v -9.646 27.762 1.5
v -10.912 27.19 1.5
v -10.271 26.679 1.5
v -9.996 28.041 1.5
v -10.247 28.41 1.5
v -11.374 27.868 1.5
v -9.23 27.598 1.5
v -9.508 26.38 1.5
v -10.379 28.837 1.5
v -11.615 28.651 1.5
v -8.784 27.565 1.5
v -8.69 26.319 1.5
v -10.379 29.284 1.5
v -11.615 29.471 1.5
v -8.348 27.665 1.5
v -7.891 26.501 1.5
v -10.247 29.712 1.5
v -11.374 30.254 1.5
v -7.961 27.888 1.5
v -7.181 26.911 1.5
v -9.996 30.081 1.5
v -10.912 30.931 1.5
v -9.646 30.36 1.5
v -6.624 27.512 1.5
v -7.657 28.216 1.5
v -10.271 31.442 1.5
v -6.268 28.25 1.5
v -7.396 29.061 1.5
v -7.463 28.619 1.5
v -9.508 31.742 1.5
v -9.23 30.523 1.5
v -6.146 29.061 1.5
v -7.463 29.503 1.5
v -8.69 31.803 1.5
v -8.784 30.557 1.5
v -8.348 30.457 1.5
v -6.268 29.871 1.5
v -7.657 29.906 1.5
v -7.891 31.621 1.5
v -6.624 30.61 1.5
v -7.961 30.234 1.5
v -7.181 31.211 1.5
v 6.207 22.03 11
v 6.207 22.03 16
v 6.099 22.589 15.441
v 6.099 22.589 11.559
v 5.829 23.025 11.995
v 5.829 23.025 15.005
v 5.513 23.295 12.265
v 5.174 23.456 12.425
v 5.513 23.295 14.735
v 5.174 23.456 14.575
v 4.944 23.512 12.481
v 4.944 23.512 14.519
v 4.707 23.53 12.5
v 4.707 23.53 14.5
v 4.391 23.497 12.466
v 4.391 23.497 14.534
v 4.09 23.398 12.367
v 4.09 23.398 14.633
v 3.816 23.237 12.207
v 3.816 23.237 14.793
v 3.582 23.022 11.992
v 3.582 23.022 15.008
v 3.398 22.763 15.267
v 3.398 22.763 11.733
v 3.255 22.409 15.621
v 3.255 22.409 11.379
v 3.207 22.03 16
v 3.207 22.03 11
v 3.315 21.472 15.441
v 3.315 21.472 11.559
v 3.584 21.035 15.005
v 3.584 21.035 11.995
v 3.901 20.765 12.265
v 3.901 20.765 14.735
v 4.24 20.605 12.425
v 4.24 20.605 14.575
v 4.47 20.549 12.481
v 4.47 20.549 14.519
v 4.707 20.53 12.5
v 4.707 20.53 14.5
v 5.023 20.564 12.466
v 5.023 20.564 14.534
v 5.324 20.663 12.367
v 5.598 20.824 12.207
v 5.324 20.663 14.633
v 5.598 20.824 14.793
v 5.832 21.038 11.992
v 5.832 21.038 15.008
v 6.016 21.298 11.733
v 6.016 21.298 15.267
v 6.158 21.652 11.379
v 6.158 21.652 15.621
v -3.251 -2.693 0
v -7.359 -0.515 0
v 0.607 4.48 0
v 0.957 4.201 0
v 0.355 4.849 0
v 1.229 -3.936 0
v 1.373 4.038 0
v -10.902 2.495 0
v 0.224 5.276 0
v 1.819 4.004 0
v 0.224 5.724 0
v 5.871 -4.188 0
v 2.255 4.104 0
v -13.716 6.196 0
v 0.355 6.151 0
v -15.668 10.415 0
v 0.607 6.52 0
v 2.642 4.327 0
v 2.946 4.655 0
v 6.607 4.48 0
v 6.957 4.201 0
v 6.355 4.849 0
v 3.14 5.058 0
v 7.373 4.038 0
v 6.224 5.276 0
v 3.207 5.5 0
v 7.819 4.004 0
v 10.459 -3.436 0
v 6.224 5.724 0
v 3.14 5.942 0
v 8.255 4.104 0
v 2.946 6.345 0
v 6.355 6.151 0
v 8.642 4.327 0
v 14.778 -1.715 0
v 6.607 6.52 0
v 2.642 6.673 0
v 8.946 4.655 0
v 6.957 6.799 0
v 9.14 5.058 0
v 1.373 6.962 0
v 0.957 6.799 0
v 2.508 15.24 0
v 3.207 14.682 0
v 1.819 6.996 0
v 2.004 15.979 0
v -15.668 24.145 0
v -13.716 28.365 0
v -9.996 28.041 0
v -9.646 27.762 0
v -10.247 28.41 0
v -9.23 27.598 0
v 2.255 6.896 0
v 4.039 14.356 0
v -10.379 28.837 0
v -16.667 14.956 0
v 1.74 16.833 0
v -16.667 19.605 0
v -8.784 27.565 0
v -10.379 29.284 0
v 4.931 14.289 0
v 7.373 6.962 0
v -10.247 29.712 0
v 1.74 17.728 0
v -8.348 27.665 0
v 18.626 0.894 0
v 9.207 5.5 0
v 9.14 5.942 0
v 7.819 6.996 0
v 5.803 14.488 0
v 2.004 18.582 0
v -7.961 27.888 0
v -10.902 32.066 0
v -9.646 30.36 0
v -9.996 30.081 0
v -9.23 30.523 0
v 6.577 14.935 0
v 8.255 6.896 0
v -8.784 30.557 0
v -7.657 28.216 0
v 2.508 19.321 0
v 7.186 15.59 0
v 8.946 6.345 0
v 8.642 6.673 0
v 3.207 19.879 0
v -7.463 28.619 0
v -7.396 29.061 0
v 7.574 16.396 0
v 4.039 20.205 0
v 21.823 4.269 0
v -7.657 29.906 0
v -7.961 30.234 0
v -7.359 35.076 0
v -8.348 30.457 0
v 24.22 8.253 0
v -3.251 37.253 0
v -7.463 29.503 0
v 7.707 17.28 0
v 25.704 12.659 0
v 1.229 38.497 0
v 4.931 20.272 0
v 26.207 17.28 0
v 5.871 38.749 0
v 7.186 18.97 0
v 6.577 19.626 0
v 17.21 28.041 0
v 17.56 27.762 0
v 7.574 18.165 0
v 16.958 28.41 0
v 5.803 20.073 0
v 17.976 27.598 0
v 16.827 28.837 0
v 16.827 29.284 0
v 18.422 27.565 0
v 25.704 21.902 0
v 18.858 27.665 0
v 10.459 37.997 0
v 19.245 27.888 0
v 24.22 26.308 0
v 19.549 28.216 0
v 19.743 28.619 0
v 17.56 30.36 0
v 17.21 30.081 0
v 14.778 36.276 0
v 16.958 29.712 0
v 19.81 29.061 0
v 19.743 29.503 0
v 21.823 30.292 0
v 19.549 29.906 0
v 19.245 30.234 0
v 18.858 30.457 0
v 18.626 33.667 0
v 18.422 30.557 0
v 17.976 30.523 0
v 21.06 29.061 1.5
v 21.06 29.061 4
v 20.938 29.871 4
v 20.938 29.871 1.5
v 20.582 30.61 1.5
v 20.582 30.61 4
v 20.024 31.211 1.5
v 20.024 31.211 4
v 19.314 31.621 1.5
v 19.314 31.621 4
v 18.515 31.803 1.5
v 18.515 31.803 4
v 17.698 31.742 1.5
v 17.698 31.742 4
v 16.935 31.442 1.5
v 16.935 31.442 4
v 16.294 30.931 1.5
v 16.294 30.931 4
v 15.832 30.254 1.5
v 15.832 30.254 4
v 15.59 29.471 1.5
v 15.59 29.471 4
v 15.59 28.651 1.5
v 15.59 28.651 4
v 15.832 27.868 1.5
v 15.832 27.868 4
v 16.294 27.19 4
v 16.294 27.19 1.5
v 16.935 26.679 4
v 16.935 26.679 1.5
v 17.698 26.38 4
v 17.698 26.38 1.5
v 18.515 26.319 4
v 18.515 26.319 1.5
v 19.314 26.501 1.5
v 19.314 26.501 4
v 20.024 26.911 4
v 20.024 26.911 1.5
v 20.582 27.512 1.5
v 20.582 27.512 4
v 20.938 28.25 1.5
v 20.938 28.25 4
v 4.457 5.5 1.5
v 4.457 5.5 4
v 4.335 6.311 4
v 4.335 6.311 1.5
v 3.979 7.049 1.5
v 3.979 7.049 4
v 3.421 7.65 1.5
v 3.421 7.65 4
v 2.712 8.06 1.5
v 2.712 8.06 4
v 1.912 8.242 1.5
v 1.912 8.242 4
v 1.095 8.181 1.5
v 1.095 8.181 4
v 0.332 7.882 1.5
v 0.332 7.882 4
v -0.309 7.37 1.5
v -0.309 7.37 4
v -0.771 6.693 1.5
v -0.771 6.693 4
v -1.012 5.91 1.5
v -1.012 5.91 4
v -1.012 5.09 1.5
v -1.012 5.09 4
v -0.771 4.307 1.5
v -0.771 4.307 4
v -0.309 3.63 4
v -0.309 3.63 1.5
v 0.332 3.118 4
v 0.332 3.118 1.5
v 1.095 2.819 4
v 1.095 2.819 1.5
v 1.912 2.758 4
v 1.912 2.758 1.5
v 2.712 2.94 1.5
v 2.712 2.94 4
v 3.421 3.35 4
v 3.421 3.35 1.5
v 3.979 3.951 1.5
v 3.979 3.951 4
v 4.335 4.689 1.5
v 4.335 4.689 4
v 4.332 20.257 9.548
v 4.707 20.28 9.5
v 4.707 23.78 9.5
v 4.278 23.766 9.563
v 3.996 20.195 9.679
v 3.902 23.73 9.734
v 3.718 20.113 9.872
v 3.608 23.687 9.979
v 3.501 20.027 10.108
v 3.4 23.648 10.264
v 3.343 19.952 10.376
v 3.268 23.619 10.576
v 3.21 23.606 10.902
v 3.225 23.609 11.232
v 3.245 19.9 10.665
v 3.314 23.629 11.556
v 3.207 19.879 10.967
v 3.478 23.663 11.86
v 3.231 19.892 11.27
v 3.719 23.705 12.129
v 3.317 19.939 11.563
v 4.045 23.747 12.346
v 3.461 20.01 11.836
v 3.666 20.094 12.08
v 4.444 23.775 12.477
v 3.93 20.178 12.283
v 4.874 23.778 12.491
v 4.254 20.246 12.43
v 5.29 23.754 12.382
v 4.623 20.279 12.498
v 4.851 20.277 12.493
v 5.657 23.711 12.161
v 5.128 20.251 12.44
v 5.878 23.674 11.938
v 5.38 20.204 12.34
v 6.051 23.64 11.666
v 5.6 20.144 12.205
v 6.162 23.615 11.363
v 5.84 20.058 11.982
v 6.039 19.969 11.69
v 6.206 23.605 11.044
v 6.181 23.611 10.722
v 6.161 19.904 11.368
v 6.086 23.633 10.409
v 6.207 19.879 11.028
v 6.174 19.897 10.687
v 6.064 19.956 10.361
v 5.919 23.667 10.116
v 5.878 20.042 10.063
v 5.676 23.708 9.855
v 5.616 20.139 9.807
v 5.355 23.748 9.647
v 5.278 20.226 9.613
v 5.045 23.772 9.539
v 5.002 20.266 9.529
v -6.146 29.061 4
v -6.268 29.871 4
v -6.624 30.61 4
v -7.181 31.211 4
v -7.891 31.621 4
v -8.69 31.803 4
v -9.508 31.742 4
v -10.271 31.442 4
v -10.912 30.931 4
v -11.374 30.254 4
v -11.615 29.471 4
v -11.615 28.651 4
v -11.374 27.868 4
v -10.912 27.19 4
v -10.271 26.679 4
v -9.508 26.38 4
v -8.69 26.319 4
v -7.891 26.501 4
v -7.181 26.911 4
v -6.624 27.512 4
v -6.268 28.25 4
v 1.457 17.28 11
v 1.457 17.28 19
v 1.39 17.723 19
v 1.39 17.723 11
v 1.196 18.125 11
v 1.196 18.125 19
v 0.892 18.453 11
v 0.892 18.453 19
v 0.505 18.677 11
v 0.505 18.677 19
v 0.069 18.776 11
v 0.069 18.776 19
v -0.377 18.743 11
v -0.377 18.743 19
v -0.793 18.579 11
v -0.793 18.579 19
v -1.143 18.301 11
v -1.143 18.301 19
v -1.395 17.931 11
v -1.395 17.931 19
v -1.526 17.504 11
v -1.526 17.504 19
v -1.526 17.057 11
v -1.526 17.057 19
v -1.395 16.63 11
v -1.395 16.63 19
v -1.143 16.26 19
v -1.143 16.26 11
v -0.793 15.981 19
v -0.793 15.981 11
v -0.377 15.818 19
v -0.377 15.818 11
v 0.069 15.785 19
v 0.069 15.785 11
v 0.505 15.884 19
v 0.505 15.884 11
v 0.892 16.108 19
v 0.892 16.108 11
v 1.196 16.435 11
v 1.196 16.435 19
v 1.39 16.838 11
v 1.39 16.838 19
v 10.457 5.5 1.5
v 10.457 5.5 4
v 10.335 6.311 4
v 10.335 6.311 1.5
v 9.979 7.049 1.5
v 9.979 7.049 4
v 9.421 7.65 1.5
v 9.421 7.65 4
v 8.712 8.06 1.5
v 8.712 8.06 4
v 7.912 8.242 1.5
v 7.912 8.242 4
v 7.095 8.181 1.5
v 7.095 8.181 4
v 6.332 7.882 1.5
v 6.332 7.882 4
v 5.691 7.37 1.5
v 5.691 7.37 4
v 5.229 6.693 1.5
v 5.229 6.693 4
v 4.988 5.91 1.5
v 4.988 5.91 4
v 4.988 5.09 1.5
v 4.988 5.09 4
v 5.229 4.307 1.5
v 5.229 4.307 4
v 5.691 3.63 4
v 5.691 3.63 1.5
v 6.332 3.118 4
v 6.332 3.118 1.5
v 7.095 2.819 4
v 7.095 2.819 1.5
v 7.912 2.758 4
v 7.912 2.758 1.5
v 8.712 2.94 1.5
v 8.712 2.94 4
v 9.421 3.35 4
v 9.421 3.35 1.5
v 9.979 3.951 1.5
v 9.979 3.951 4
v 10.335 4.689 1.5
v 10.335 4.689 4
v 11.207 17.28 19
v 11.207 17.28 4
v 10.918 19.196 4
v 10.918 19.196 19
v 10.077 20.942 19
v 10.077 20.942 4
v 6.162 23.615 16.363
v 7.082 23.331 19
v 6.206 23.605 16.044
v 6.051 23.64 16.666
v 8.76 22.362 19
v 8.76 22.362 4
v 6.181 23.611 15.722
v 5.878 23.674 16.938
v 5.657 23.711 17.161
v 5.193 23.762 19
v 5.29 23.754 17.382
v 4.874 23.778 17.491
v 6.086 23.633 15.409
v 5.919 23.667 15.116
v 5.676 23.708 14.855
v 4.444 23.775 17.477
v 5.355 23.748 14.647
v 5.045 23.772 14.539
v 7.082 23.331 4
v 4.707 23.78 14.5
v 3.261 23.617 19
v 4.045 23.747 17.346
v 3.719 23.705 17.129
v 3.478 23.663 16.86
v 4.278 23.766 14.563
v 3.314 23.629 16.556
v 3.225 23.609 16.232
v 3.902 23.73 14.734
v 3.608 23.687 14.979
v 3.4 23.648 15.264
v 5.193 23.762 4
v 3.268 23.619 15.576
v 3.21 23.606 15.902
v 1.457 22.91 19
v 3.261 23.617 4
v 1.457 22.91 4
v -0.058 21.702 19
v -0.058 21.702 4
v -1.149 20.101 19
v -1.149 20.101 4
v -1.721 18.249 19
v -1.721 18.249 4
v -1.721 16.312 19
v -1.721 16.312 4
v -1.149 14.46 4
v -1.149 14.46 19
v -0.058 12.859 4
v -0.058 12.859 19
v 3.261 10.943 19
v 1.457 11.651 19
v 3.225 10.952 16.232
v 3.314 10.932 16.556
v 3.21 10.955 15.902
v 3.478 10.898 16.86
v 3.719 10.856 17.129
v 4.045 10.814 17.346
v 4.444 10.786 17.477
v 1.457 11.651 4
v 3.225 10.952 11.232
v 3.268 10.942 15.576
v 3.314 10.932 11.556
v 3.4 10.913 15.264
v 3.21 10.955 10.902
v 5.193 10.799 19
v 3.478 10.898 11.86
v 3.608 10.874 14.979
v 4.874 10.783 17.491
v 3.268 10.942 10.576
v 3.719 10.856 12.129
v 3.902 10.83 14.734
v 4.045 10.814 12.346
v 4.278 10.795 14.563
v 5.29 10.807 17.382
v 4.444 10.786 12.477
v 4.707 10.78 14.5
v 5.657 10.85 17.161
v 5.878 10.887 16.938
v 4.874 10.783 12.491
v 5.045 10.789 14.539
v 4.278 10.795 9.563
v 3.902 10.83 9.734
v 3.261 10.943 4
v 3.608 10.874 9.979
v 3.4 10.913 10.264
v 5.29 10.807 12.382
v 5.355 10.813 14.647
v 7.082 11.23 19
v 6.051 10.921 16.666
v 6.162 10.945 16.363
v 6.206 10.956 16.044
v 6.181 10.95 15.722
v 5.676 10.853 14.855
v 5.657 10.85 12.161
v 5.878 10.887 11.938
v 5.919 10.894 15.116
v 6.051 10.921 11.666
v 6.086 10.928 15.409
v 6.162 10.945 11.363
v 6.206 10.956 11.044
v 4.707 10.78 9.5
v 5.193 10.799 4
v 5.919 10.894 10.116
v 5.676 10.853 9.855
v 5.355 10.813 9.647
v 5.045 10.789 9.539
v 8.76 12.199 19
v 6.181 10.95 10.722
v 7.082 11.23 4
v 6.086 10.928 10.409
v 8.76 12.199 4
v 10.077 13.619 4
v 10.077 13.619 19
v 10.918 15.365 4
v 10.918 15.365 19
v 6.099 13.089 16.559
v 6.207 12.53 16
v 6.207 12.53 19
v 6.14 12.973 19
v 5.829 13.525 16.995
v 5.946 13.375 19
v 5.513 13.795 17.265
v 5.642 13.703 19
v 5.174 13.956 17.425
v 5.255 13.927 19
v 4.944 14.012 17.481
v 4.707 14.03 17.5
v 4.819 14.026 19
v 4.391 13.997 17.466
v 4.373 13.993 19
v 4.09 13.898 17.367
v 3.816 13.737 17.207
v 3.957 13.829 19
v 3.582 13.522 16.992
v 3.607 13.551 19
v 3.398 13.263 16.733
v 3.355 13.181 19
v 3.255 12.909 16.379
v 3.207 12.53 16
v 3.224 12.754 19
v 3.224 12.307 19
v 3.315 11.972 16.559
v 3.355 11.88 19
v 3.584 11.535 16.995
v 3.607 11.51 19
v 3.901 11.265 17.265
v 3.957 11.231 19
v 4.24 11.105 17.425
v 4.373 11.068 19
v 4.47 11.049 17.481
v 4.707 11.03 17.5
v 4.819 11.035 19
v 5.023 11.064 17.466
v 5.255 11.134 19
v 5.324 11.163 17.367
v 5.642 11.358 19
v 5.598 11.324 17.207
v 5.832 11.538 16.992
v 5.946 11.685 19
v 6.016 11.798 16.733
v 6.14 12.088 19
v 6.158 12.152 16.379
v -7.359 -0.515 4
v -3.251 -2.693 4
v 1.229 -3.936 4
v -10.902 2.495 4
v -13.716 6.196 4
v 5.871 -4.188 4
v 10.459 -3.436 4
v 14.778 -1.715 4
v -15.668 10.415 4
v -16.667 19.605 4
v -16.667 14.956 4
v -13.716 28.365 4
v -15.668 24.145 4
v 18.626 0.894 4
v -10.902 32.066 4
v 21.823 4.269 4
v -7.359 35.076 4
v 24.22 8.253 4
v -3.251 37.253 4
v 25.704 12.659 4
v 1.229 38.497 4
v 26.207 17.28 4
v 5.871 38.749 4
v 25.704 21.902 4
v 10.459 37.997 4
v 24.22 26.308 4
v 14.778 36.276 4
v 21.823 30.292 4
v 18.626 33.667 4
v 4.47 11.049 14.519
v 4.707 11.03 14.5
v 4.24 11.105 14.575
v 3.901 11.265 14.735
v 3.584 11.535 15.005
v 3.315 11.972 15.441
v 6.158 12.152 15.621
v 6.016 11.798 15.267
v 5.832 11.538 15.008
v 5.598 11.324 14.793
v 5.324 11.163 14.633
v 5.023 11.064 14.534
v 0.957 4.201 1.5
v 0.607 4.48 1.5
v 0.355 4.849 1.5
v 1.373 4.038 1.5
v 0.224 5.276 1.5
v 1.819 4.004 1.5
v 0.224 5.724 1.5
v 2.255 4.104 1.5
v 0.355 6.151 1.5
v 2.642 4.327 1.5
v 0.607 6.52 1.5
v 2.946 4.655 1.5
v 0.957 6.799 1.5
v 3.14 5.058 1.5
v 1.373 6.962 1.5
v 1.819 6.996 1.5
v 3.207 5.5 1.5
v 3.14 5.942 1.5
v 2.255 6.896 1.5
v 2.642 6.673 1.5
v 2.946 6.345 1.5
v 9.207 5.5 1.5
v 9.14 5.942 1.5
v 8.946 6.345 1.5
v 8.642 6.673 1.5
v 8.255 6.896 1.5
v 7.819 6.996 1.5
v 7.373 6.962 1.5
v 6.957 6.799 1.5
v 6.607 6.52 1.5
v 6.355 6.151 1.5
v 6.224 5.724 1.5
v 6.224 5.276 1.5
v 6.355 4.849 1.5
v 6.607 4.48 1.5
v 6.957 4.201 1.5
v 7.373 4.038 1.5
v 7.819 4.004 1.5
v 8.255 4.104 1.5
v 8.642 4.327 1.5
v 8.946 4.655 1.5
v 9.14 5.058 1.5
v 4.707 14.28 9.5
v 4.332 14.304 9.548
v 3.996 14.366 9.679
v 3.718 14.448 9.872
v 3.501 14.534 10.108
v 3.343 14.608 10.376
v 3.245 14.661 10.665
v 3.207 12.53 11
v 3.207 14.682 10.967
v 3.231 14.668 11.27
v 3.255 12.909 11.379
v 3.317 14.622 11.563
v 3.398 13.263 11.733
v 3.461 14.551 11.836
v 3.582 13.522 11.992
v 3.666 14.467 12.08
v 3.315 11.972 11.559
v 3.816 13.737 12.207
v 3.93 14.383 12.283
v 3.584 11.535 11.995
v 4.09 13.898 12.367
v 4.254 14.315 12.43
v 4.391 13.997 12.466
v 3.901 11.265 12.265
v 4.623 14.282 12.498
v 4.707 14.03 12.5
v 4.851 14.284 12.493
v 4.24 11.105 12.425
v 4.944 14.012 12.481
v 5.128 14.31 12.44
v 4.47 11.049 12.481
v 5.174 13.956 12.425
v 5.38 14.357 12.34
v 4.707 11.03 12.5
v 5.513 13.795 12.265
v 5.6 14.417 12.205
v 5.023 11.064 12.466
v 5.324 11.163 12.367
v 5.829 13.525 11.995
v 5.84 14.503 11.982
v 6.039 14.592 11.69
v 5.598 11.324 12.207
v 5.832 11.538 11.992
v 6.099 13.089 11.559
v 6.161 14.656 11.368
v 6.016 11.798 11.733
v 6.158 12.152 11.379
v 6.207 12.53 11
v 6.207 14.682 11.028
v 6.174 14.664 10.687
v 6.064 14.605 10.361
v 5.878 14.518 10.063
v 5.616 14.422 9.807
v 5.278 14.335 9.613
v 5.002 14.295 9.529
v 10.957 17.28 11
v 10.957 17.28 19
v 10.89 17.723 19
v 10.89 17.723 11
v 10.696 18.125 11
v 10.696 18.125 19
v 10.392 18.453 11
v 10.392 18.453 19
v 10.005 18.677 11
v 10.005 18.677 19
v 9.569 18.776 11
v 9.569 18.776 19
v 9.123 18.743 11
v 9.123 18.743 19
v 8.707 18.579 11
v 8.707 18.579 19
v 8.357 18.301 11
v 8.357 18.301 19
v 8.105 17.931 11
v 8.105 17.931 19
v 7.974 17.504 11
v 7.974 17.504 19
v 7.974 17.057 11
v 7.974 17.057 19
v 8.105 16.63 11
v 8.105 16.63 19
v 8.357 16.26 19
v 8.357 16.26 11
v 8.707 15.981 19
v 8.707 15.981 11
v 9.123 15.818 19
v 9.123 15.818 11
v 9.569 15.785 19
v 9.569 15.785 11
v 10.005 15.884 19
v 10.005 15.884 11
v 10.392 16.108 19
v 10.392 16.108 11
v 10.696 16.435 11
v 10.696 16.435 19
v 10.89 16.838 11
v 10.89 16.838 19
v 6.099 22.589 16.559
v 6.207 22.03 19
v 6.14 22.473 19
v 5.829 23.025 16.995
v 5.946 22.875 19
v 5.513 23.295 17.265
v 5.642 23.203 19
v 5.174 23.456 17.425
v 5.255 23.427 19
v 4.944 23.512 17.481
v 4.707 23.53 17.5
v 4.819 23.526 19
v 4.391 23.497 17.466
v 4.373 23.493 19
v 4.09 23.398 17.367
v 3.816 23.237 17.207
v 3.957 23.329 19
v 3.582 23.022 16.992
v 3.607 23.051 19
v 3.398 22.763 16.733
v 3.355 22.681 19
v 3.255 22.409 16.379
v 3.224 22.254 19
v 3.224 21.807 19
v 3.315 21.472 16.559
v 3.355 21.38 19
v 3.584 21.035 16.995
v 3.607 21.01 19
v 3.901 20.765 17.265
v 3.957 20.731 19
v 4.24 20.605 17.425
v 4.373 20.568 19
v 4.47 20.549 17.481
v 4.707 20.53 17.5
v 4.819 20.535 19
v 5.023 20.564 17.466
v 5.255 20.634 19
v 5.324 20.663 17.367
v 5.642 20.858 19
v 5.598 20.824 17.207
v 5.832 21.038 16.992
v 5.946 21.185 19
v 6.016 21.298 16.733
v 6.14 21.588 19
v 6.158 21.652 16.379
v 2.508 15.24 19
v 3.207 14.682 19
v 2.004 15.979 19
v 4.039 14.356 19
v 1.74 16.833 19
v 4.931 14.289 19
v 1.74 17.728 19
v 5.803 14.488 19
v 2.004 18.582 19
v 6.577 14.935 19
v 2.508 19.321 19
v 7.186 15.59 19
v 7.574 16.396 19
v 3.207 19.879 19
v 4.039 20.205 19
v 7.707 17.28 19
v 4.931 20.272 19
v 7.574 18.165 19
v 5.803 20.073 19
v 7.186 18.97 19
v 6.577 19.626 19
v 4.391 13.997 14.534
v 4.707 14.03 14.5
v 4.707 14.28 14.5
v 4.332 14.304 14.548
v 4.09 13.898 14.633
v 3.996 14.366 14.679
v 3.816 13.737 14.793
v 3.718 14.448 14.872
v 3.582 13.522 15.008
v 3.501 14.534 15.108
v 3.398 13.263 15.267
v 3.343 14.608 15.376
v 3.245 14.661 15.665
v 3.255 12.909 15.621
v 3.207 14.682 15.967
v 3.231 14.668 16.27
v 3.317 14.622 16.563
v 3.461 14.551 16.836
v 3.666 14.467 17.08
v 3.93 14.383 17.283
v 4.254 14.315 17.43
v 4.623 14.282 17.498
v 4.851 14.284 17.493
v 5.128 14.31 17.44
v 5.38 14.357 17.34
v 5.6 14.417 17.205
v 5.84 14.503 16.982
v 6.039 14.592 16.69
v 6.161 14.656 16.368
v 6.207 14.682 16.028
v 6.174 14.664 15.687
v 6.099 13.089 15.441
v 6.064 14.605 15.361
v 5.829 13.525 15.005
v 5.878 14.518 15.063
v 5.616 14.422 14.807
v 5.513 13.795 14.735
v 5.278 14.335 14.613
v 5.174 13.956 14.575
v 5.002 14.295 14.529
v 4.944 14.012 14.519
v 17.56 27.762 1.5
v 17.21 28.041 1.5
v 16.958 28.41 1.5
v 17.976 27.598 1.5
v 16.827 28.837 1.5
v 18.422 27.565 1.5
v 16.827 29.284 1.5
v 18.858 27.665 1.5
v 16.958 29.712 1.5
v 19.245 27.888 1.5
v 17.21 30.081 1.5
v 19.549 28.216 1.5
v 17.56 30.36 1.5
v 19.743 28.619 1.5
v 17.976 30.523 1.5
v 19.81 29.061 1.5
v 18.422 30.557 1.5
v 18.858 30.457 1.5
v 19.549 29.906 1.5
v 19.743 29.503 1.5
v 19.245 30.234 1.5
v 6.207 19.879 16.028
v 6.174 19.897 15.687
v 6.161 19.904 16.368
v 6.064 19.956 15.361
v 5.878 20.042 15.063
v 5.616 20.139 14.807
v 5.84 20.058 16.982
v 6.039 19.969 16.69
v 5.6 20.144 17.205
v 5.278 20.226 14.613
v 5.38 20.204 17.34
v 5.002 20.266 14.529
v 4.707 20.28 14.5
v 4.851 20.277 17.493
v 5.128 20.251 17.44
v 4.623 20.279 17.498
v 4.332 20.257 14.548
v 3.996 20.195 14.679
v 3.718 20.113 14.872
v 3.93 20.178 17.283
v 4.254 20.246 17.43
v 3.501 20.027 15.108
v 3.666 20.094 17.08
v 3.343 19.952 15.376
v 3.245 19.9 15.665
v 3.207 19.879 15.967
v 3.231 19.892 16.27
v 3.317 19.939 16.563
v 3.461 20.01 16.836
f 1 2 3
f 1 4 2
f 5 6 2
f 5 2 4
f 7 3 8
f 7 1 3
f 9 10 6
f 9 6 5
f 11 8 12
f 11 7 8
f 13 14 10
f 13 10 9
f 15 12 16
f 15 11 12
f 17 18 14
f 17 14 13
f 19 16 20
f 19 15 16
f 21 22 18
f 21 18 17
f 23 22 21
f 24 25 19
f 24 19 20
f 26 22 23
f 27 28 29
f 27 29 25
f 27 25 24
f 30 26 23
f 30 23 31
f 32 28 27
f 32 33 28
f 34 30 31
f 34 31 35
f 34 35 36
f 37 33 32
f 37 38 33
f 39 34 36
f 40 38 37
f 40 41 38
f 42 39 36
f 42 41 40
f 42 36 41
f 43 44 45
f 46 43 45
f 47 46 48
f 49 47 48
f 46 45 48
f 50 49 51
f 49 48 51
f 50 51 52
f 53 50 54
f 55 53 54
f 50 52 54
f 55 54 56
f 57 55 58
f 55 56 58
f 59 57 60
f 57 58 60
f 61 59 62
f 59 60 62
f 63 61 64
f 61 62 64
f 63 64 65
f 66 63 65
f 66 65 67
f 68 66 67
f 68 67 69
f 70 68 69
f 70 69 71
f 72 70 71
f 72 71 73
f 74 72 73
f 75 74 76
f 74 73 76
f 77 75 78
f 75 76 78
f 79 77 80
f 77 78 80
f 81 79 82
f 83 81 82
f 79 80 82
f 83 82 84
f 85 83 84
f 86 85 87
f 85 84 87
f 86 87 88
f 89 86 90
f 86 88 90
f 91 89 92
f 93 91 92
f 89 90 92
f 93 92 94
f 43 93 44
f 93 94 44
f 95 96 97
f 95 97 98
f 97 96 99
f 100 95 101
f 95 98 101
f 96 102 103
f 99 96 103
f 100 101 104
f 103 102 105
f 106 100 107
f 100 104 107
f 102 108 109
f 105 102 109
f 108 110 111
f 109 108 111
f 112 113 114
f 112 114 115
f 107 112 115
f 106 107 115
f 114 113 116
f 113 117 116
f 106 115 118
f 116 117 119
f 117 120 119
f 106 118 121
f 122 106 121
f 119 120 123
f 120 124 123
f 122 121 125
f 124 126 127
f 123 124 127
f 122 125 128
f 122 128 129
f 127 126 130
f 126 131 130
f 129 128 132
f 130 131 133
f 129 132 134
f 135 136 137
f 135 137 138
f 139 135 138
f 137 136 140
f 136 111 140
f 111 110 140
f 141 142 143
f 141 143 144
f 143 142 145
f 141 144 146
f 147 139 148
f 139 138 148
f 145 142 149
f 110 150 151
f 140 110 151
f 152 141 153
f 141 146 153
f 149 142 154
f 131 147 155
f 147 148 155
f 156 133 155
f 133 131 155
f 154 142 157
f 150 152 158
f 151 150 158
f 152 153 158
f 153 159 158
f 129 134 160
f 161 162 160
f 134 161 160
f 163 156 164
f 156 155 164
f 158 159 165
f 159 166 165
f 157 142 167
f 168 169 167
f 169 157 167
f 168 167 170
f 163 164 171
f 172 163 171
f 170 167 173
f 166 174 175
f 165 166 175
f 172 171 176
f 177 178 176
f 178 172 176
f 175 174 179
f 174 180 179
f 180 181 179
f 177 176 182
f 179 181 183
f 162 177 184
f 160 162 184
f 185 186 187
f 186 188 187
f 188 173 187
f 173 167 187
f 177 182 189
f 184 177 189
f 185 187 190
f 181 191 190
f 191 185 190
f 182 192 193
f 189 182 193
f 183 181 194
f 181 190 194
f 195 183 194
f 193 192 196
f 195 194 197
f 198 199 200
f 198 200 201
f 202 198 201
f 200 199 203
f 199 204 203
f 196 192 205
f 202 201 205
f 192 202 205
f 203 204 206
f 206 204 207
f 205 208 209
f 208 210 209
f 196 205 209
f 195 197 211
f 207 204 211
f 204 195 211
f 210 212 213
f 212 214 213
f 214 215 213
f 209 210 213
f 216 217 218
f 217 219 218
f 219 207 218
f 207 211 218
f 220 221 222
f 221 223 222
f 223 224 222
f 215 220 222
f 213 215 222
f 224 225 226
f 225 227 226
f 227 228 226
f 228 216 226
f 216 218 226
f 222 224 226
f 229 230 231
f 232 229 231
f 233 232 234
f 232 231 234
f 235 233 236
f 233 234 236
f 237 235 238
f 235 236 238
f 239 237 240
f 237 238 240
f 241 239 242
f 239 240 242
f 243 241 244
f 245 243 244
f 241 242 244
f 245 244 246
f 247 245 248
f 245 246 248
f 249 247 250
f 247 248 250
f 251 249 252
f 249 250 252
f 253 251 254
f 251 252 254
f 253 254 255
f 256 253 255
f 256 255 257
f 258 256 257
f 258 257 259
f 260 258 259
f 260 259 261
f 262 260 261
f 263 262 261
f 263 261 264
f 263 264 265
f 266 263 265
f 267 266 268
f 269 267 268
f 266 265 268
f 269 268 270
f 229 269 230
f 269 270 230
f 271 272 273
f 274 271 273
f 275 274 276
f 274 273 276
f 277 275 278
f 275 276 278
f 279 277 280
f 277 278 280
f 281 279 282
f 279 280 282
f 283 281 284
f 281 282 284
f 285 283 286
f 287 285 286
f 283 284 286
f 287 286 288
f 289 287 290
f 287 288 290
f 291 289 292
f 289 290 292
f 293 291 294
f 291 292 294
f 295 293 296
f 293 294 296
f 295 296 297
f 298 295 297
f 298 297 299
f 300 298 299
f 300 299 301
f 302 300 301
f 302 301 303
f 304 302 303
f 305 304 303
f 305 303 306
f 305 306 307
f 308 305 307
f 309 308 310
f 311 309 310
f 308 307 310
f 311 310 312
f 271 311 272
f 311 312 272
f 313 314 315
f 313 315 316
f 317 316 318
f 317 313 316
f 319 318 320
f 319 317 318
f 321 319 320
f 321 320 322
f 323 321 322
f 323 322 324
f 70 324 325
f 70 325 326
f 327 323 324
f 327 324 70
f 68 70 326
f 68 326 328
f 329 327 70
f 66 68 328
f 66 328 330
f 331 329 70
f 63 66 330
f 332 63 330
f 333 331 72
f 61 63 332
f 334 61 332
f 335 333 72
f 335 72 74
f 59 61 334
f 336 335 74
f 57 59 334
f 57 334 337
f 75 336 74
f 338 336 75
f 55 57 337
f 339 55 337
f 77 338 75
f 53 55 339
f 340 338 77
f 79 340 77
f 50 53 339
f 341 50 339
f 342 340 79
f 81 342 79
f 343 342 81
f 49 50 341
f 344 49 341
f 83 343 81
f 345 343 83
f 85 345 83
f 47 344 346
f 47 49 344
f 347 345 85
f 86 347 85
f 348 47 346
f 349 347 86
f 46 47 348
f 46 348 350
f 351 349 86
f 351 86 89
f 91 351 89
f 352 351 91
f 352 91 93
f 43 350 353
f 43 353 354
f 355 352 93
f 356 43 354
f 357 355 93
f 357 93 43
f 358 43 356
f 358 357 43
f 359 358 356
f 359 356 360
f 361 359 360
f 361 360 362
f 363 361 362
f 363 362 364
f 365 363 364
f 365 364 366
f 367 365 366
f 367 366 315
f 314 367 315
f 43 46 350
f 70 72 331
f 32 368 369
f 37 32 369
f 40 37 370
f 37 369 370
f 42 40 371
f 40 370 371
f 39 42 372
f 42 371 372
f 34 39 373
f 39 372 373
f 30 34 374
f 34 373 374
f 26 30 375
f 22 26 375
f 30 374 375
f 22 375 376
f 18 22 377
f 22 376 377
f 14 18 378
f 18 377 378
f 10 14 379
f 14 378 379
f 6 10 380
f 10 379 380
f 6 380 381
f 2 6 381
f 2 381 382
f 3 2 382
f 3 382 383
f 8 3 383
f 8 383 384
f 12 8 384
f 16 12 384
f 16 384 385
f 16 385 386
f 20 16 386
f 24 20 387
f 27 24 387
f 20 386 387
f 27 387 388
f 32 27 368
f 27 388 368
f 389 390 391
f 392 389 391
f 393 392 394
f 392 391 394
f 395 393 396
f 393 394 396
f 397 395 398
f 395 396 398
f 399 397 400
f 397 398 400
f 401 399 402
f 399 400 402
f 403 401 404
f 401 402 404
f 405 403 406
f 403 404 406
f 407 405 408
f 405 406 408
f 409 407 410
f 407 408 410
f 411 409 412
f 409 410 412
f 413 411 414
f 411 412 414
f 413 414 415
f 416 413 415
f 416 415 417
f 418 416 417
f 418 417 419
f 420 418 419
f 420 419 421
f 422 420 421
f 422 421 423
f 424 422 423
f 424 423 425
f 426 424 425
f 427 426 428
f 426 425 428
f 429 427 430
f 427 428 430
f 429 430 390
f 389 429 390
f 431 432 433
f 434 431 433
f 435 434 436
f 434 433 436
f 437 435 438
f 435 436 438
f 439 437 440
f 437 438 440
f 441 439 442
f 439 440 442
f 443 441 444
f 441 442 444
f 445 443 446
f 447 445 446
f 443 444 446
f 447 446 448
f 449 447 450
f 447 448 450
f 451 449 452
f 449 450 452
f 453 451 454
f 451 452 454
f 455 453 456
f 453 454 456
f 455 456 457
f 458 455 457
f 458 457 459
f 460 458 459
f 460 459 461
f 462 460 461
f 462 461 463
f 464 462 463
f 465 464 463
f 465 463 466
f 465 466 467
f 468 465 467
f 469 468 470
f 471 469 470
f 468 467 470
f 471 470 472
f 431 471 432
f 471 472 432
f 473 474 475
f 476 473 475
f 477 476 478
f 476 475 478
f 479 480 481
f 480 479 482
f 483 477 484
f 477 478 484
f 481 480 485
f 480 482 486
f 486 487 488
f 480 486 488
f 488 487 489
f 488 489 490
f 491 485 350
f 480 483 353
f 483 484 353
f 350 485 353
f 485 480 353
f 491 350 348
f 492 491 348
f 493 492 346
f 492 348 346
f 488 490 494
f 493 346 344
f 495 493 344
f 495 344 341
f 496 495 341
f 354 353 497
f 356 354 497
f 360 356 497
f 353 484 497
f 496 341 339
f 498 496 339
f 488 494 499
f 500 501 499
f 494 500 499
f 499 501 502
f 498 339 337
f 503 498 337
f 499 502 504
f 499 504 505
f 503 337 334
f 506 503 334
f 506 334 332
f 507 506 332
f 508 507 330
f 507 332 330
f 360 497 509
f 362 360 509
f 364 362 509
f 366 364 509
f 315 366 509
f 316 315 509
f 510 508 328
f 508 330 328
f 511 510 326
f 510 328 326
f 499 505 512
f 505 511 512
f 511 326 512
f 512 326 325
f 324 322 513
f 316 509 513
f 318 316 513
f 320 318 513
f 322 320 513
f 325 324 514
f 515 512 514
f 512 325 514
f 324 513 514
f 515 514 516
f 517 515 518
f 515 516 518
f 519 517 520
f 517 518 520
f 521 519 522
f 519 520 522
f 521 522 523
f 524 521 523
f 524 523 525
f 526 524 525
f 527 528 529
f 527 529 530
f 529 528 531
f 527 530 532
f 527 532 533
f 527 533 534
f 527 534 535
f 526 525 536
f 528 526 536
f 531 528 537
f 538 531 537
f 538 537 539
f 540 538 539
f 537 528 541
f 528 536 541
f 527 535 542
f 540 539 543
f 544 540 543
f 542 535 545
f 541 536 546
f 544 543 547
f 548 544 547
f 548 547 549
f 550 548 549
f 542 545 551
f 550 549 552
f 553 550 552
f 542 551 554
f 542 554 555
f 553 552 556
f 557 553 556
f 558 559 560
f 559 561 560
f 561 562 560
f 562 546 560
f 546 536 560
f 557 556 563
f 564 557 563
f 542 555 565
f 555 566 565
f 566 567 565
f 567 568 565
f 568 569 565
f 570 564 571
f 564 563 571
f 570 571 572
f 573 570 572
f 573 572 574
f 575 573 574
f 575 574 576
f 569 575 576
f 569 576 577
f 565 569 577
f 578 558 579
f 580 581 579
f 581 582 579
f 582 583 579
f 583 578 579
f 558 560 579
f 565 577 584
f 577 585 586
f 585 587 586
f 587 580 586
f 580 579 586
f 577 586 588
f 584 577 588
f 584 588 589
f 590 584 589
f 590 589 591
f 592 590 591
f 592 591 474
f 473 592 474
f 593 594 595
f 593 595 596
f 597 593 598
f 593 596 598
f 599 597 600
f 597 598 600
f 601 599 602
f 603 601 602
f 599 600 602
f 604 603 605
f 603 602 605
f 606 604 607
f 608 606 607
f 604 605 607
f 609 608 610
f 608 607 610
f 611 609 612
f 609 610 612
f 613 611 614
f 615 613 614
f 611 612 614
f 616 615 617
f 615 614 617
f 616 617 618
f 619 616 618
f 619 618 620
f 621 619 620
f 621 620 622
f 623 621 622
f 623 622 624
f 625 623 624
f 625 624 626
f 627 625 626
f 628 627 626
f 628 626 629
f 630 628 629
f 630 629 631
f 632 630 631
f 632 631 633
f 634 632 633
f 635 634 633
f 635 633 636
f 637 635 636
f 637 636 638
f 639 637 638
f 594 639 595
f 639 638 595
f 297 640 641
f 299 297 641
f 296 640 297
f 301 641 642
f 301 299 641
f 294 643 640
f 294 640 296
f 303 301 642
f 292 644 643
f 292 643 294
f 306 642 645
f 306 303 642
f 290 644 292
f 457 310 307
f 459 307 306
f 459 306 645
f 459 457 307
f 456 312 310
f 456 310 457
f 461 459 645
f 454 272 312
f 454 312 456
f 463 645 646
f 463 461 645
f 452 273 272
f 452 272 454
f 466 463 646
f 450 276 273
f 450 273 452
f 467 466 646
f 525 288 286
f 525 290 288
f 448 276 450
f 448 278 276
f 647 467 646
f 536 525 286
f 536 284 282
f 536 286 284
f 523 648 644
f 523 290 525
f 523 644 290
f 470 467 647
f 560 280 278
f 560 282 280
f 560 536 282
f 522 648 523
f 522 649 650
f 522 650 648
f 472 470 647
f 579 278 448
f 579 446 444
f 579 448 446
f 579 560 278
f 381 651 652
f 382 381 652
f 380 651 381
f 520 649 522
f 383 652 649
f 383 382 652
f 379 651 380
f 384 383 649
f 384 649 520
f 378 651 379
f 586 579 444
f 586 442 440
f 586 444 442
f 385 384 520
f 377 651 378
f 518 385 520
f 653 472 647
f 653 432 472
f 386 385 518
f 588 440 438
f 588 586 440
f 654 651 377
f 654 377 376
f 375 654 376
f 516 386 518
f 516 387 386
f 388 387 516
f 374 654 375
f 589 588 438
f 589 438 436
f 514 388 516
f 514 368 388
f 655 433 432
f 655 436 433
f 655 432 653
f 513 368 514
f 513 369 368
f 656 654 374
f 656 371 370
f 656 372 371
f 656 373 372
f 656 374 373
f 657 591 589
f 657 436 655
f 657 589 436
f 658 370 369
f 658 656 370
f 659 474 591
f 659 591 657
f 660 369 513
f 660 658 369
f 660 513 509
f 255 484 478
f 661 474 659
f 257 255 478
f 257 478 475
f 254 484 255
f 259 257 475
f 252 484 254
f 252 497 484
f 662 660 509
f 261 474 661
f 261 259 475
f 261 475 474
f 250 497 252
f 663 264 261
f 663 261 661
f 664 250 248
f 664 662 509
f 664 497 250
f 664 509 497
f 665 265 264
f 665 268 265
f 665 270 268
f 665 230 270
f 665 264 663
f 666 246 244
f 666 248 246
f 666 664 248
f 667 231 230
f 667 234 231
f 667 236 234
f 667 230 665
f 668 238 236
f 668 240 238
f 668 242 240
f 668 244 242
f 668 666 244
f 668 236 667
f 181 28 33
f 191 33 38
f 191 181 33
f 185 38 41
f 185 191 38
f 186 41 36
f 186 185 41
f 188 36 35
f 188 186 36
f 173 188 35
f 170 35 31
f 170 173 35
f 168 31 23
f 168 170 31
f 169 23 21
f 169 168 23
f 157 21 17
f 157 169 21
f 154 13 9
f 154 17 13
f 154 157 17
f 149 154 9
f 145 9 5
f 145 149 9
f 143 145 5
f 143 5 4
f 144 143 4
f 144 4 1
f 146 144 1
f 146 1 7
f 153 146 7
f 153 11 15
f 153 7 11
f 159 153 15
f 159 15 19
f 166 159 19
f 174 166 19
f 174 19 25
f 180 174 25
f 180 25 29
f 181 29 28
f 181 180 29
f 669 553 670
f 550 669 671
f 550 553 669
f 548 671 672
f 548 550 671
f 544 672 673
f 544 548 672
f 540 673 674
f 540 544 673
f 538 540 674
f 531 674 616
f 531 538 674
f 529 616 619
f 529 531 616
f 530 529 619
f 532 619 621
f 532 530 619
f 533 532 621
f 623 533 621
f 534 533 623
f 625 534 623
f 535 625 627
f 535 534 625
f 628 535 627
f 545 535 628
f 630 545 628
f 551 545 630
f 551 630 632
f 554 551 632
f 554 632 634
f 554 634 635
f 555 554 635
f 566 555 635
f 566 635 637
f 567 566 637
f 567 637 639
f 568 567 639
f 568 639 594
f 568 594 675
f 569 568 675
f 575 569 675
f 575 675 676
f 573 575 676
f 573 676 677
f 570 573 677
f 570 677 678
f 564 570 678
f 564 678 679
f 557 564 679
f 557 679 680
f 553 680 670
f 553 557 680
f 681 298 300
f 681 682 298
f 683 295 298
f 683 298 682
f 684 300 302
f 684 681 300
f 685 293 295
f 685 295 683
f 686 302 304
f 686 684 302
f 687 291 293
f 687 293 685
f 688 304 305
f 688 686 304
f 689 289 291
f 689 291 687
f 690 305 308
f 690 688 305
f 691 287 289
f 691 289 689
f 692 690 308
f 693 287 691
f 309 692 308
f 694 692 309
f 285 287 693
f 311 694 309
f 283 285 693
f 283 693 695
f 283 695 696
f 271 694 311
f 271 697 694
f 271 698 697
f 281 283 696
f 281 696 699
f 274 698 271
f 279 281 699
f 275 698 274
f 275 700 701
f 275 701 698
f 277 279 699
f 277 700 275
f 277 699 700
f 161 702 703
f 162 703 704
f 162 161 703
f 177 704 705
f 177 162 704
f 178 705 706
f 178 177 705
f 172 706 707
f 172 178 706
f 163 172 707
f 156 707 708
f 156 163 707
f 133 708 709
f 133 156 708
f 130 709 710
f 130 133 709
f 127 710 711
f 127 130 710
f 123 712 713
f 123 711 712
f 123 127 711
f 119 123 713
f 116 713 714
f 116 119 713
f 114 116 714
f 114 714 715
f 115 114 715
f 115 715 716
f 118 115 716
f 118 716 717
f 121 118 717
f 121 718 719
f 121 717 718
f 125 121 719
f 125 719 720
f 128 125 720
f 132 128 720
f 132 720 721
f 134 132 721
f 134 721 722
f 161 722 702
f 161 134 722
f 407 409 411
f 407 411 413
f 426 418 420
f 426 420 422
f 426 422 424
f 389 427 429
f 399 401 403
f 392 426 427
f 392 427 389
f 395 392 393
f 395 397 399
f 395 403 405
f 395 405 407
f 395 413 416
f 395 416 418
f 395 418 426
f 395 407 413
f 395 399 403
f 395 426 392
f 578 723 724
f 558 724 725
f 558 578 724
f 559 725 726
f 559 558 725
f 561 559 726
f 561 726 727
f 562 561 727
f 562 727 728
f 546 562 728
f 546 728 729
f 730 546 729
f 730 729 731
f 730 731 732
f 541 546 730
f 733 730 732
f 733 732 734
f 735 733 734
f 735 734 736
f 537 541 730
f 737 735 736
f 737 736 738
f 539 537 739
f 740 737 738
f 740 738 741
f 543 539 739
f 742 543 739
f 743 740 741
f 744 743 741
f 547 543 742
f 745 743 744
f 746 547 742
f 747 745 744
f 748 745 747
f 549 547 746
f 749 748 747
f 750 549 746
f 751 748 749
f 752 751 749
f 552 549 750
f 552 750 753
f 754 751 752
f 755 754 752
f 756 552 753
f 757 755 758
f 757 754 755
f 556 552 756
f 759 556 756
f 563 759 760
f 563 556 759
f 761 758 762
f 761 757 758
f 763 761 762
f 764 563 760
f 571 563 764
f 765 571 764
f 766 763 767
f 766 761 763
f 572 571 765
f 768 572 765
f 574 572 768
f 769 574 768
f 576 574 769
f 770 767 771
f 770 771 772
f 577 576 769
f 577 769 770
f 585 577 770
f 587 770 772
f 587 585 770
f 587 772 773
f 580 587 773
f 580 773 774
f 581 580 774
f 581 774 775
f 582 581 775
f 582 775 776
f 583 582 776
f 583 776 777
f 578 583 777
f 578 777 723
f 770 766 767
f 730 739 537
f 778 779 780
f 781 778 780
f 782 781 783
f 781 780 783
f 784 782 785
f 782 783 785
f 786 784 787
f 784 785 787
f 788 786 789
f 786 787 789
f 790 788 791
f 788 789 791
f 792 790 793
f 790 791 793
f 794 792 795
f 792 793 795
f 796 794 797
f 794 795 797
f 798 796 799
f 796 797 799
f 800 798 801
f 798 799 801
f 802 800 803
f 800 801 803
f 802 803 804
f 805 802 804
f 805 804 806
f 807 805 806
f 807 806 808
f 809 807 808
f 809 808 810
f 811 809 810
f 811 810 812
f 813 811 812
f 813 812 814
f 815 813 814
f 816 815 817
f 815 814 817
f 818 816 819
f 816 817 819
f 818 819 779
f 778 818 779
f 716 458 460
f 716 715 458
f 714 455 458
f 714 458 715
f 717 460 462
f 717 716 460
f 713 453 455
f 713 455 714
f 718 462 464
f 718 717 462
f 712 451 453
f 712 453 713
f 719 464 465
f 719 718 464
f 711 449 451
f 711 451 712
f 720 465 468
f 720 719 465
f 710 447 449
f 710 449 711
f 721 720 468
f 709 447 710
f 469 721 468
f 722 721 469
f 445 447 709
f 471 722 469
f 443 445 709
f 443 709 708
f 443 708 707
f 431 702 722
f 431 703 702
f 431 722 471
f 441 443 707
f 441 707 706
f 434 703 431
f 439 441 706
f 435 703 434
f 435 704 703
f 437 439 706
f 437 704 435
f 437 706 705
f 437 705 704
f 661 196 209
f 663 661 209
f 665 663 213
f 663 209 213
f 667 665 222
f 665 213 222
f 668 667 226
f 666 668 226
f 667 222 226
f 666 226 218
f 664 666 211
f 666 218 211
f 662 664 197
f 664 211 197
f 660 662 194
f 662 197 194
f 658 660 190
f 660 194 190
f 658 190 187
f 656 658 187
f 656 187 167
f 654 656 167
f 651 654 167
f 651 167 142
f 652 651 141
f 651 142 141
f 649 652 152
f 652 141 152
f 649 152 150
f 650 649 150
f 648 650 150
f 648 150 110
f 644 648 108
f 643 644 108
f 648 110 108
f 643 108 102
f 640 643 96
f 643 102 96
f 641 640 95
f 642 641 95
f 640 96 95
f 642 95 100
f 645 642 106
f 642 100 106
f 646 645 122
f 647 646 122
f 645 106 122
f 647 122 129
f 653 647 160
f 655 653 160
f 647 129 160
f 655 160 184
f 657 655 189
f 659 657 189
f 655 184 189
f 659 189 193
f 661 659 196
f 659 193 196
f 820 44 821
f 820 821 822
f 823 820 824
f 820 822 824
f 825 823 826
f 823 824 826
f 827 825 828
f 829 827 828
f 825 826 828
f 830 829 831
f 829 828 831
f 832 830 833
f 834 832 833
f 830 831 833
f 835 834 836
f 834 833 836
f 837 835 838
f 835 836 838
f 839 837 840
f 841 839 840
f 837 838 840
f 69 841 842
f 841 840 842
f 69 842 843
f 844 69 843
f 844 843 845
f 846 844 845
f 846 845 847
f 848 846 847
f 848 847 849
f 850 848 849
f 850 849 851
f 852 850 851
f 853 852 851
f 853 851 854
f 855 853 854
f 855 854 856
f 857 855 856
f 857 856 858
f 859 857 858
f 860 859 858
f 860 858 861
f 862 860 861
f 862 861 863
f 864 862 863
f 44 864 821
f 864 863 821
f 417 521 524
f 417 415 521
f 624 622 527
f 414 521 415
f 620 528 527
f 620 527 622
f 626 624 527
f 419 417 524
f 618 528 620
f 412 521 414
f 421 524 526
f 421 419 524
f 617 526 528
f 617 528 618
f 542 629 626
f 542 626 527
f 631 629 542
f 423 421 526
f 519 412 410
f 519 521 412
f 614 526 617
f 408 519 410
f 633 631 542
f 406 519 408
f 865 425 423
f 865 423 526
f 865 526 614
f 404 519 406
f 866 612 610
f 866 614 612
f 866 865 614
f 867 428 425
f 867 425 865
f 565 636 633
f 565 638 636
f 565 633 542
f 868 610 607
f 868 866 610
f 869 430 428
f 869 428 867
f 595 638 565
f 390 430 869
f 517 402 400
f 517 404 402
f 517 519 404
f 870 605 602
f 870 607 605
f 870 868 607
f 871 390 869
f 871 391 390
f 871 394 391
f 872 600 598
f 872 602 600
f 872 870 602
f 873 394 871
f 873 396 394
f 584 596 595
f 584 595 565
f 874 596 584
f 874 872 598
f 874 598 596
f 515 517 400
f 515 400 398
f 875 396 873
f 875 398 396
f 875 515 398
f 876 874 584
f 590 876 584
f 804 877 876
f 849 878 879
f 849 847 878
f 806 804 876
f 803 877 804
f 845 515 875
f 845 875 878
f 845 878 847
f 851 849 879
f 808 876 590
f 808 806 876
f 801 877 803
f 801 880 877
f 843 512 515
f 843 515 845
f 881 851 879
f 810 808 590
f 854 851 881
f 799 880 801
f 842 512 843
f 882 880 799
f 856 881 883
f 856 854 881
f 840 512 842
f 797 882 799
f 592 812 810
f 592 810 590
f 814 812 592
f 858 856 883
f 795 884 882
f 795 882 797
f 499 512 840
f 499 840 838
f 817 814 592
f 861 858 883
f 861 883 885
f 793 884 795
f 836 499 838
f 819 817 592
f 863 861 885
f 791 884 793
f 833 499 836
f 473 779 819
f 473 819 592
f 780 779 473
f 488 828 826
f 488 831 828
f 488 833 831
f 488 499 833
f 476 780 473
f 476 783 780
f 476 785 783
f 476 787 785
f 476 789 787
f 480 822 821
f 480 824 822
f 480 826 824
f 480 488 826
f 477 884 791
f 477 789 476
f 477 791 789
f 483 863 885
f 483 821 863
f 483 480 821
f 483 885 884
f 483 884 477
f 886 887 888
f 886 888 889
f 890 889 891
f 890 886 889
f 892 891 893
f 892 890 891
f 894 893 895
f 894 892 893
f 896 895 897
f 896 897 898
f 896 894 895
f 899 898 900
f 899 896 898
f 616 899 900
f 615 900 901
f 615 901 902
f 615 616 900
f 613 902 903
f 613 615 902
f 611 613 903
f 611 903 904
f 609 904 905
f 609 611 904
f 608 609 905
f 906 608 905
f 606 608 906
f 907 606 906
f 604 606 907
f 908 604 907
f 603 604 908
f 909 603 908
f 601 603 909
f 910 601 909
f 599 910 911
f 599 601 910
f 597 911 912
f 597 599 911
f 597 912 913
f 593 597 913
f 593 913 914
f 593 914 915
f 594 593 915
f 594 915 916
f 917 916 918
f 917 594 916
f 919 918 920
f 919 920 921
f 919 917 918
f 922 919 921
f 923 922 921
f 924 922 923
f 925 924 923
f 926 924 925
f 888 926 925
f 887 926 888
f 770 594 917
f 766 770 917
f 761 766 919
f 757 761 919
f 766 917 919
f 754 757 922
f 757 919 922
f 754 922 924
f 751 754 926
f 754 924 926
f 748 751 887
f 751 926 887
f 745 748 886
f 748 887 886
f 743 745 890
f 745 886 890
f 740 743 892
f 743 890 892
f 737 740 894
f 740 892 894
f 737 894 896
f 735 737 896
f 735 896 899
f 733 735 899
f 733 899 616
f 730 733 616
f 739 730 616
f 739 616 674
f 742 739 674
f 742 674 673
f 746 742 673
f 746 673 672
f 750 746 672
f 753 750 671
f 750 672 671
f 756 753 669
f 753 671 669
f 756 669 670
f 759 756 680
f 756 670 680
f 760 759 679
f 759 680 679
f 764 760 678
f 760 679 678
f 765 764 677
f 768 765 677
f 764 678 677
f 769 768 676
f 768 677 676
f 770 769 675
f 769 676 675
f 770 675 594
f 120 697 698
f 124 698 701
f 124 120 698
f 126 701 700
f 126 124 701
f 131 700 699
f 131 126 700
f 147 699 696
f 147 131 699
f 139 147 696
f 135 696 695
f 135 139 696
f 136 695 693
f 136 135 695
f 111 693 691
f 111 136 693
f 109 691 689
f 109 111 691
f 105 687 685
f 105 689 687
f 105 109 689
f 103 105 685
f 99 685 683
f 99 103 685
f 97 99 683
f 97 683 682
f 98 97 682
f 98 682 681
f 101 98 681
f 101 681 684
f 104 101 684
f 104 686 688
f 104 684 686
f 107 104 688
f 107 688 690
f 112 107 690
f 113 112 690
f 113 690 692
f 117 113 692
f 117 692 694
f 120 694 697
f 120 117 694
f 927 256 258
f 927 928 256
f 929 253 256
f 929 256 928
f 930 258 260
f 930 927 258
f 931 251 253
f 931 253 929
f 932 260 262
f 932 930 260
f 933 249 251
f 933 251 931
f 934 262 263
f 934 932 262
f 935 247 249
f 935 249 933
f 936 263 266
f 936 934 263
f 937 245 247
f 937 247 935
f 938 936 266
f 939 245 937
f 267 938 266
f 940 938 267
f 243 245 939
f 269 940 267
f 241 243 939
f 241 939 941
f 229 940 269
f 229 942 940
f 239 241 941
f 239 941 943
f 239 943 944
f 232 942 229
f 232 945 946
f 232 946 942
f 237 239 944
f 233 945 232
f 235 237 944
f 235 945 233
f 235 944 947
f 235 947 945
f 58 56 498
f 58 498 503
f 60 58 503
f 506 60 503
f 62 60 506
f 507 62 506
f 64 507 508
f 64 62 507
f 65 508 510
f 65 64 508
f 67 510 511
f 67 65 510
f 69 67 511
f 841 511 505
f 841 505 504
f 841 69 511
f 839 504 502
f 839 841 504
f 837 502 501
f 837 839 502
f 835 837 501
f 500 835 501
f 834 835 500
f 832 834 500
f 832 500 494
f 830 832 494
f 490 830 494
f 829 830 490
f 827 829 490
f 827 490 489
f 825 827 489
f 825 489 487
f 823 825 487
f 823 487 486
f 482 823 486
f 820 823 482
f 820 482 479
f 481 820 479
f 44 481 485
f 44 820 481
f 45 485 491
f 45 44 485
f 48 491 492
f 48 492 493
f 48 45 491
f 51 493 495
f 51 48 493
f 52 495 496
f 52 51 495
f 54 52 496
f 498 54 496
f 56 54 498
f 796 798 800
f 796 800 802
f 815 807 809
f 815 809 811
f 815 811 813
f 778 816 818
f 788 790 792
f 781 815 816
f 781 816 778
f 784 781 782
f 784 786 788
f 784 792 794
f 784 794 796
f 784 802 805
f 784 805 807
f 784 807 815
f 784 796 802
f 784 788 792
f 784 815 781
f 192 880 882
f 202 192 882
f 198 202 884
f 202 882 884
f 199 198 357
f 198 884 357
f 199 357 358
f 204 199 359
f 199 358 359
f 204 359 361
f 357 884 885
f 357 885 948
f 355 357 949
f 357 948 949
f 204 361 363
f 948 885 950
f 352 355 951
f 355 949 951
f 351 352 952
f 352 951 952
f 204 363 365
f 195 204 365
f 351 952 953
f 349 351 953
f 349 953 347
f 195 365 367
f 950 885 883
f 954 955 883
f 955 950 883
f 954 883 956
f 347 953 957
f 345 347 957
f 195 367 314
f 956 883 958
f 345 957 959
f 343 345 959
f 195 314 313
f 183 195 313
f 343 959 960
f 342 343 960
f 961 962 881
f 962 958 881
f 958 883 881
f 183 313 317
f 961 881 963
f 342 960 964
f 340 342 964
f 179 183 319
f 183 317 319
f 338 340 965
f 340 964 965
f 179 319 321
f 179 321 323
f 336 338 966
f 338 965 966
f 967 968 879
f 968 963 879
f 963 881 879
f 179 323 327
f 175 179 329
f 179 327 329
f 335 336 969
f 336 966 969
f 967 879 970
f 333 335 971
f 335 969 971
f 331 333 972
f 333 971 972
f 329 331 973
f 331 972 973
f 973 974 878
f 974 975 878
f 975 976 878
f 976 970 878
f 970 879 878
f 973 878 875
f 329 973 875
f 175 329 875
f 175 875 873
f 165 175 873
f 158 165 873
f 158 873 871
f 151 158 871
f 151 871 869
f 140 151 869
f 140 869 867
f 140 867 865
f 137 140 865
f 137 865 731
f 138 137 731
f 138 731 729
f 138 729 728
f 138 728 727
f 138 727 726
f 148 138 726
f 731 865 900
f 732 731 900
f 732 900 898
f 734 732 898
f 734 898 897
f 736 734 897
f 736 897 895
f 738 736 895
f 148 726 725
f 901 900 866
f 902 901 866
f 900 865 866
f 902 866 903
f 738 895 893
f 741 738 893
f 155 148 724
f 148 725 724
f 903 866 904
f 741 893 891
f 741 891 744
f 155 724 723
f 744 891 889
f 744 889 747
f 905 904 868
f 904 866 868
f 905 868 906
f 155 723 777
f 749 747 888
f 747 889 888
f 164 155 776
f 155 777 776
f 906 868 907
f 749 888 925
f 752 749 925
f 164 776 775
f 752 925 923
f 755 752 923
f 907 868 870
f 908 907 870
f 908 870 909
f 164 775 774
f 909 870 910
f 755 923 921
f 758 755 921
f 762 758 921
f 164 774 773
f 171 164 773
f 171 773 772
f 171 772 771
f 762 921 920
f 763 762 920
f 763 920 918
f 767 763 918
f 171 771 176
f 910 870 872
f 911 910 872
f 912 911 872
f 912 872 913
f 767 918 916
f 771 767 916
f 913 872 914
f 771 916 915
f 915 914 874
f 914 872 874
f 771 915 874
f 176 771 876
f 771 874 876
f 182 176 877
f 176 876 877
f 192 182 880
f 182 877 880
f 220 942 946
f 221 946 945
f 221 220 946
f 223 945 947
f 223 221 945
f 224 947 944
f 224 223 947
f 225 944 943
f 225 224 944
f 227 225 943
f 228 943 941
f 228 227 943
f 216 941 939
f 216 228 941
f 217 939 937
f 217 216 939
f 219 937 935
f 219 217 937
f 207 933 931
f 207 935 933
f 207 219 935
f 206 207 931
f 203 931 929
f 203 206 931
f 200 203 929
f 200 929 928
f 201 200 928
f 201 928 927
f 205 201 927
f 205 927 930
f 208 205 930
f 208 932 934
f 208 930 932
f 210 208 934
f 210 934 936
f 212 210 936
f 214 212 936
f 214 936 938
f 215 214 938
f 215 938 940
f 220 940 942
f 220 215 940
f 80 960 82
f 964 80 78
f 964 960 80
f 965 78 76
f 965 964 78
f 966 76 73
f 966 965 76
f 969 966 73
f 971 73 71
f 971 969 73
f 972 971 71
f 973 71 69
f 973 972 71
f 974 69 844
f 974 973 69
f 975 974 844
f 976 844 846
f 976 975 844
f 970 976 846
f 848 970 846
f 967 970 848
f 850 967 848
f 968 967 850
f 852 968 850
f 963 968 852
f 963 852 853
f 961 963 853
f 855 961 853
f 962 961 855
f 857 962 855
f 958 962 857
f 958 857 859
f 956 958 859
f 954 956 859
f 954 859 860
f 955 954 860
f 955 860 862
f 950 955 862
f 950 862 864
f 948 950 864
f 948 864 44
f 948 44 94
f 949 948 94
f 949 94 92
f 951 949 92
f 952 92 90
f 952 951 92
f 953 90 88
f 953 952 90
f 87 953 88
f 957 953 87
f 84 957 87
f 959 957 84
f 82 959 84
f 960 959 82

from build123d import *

# Parameters (mm, degrees)
SKETCH2_R           = 21.5
SKETCH2_R_2         = 1.5
SKETCH2_R_3         = 1.499999999
BOSS_EXTRUDE1_DEPTH = 4
SKETCH4_R           = 2.75
CUT_EXTRUDE1_DEPTH  = 2.5
SKETCH6_R           = 6.5
BOSS_EXTRUDE2_DEPTH = 15
SKETCH8_R           = 3
CUT_EXTRUDE2_DEPTH  = 61
SKETCH9_R           = 1.5
CUT_EXTRUDE3_DEPTH  = 8
SKETCH11_R          = 1.5
CUT_EXTRUDE5_DEPTH  = 29.064832946


with BuildPart() as part:
    # Sketch2 → Boss-Extrude1 (new body)
    with BuildSketch(Plane.XY):
        with Locations((4.706896552, 17.280444568)):
            Circle(SKETCH2_R)
        with Locations((-8.895989131, 29.060889133)):
            Circle(SKETCH2_R_2, mode=Mode.SUBTRACT)
        with Locations((18.309782235, 29.060889133)):
            Circle(SKETCH2_R_3, mode=Mode.SUBTRACT)
        with Locations((1.706896552, 5.5)):
            Circle(SKETCH2_R_2, mode=Mode.SUBTRACT)
        with Locations((7.706896552, 5.5)):
            Circle(SKETCH2_R_2, mode=Mode.SUBTRACT)
    extrude(amount=BOSS_EXTRUDE1_DEPTH)

    # Sketch4 → Cut-Extrude1 (cut)
    with BuildSketch(Plane.XY.offset(4)):
        with Locations((-8.895989131, 29.060889133)):
            Circle(SKETCH4_R)
        with Locations((18.309782235, 29.060889133)):
            Circle(SKETCH4_R)
        with Locations((7.706896552, 5.5)):
            Circle(SKETCH4_R)
        with Locations((1.706896552, 5.5)):
            Circle(SKETCH4_R)
    extrude(amount=-CUT_EXTRUDE1_DEPTH, mode=Mode.SUBTRACT)

    # Sketch6 → Boss-Extrude2 (add)
    with BuildSketch(Plane.XY.offset(4)):
        with Locations((4.706896552, 17.280444568)):
            Circle(SKETCH6_R)
    extrude(amount=BOSS_EXTRUDE2_DEPTH)

    # Sketch8 → Cut-Extrude2 (cut)
    with BuildSketch(Plane.XY.offset(19)):
        with Locations((4.706896552, 17.280444568)):
            Circle(SKETCH8_R)
    extrude(amount=-CUT_EXTRUDE2_DEPTH, mode=Mode.SUBTRACT)

    # Sketch9 → Cut-Extrude3 (cut)
    with BuildSketch(Plane.XY.offset(19)):
        with Locations((4.706896552, 22.030444568)):
            Circle(SKETCH9_R)
        with Locations((9.456896552, 17.280444568)):
            Circle(SKETCH9_R)
        with Locations((4.706896552, 12.530444568)):
            Circle(SKETCH9_R)
        with Locations((-0.043103448, 17.280444568)):
            Circle(SKETCH9_R)
    extrude(amount=-CUT_EXTRUDE3_DEPTH, mode=Mode.SUBTRACT)

    # Sketch11 → Cut-Extrude5 (cut)
    with BuildSketch(Plane(origin=(0, 0, 0), x_dir=(1, 0, 0), z_dir=(0, 1, 0))):
        with Locations(Location((4.706896552, -16, 0), (0, 0, 90))):
            Circle(SKETCH11_R)
        with Locations(Location((4.706896552, -11, 0), (0, 0, 90))):
            Circle(SKETCH11_R)
    extrude(amount=CUT_EXTRUDE5_DEPTH, mode=Mode.SUBTRACT)


solid = part.part
